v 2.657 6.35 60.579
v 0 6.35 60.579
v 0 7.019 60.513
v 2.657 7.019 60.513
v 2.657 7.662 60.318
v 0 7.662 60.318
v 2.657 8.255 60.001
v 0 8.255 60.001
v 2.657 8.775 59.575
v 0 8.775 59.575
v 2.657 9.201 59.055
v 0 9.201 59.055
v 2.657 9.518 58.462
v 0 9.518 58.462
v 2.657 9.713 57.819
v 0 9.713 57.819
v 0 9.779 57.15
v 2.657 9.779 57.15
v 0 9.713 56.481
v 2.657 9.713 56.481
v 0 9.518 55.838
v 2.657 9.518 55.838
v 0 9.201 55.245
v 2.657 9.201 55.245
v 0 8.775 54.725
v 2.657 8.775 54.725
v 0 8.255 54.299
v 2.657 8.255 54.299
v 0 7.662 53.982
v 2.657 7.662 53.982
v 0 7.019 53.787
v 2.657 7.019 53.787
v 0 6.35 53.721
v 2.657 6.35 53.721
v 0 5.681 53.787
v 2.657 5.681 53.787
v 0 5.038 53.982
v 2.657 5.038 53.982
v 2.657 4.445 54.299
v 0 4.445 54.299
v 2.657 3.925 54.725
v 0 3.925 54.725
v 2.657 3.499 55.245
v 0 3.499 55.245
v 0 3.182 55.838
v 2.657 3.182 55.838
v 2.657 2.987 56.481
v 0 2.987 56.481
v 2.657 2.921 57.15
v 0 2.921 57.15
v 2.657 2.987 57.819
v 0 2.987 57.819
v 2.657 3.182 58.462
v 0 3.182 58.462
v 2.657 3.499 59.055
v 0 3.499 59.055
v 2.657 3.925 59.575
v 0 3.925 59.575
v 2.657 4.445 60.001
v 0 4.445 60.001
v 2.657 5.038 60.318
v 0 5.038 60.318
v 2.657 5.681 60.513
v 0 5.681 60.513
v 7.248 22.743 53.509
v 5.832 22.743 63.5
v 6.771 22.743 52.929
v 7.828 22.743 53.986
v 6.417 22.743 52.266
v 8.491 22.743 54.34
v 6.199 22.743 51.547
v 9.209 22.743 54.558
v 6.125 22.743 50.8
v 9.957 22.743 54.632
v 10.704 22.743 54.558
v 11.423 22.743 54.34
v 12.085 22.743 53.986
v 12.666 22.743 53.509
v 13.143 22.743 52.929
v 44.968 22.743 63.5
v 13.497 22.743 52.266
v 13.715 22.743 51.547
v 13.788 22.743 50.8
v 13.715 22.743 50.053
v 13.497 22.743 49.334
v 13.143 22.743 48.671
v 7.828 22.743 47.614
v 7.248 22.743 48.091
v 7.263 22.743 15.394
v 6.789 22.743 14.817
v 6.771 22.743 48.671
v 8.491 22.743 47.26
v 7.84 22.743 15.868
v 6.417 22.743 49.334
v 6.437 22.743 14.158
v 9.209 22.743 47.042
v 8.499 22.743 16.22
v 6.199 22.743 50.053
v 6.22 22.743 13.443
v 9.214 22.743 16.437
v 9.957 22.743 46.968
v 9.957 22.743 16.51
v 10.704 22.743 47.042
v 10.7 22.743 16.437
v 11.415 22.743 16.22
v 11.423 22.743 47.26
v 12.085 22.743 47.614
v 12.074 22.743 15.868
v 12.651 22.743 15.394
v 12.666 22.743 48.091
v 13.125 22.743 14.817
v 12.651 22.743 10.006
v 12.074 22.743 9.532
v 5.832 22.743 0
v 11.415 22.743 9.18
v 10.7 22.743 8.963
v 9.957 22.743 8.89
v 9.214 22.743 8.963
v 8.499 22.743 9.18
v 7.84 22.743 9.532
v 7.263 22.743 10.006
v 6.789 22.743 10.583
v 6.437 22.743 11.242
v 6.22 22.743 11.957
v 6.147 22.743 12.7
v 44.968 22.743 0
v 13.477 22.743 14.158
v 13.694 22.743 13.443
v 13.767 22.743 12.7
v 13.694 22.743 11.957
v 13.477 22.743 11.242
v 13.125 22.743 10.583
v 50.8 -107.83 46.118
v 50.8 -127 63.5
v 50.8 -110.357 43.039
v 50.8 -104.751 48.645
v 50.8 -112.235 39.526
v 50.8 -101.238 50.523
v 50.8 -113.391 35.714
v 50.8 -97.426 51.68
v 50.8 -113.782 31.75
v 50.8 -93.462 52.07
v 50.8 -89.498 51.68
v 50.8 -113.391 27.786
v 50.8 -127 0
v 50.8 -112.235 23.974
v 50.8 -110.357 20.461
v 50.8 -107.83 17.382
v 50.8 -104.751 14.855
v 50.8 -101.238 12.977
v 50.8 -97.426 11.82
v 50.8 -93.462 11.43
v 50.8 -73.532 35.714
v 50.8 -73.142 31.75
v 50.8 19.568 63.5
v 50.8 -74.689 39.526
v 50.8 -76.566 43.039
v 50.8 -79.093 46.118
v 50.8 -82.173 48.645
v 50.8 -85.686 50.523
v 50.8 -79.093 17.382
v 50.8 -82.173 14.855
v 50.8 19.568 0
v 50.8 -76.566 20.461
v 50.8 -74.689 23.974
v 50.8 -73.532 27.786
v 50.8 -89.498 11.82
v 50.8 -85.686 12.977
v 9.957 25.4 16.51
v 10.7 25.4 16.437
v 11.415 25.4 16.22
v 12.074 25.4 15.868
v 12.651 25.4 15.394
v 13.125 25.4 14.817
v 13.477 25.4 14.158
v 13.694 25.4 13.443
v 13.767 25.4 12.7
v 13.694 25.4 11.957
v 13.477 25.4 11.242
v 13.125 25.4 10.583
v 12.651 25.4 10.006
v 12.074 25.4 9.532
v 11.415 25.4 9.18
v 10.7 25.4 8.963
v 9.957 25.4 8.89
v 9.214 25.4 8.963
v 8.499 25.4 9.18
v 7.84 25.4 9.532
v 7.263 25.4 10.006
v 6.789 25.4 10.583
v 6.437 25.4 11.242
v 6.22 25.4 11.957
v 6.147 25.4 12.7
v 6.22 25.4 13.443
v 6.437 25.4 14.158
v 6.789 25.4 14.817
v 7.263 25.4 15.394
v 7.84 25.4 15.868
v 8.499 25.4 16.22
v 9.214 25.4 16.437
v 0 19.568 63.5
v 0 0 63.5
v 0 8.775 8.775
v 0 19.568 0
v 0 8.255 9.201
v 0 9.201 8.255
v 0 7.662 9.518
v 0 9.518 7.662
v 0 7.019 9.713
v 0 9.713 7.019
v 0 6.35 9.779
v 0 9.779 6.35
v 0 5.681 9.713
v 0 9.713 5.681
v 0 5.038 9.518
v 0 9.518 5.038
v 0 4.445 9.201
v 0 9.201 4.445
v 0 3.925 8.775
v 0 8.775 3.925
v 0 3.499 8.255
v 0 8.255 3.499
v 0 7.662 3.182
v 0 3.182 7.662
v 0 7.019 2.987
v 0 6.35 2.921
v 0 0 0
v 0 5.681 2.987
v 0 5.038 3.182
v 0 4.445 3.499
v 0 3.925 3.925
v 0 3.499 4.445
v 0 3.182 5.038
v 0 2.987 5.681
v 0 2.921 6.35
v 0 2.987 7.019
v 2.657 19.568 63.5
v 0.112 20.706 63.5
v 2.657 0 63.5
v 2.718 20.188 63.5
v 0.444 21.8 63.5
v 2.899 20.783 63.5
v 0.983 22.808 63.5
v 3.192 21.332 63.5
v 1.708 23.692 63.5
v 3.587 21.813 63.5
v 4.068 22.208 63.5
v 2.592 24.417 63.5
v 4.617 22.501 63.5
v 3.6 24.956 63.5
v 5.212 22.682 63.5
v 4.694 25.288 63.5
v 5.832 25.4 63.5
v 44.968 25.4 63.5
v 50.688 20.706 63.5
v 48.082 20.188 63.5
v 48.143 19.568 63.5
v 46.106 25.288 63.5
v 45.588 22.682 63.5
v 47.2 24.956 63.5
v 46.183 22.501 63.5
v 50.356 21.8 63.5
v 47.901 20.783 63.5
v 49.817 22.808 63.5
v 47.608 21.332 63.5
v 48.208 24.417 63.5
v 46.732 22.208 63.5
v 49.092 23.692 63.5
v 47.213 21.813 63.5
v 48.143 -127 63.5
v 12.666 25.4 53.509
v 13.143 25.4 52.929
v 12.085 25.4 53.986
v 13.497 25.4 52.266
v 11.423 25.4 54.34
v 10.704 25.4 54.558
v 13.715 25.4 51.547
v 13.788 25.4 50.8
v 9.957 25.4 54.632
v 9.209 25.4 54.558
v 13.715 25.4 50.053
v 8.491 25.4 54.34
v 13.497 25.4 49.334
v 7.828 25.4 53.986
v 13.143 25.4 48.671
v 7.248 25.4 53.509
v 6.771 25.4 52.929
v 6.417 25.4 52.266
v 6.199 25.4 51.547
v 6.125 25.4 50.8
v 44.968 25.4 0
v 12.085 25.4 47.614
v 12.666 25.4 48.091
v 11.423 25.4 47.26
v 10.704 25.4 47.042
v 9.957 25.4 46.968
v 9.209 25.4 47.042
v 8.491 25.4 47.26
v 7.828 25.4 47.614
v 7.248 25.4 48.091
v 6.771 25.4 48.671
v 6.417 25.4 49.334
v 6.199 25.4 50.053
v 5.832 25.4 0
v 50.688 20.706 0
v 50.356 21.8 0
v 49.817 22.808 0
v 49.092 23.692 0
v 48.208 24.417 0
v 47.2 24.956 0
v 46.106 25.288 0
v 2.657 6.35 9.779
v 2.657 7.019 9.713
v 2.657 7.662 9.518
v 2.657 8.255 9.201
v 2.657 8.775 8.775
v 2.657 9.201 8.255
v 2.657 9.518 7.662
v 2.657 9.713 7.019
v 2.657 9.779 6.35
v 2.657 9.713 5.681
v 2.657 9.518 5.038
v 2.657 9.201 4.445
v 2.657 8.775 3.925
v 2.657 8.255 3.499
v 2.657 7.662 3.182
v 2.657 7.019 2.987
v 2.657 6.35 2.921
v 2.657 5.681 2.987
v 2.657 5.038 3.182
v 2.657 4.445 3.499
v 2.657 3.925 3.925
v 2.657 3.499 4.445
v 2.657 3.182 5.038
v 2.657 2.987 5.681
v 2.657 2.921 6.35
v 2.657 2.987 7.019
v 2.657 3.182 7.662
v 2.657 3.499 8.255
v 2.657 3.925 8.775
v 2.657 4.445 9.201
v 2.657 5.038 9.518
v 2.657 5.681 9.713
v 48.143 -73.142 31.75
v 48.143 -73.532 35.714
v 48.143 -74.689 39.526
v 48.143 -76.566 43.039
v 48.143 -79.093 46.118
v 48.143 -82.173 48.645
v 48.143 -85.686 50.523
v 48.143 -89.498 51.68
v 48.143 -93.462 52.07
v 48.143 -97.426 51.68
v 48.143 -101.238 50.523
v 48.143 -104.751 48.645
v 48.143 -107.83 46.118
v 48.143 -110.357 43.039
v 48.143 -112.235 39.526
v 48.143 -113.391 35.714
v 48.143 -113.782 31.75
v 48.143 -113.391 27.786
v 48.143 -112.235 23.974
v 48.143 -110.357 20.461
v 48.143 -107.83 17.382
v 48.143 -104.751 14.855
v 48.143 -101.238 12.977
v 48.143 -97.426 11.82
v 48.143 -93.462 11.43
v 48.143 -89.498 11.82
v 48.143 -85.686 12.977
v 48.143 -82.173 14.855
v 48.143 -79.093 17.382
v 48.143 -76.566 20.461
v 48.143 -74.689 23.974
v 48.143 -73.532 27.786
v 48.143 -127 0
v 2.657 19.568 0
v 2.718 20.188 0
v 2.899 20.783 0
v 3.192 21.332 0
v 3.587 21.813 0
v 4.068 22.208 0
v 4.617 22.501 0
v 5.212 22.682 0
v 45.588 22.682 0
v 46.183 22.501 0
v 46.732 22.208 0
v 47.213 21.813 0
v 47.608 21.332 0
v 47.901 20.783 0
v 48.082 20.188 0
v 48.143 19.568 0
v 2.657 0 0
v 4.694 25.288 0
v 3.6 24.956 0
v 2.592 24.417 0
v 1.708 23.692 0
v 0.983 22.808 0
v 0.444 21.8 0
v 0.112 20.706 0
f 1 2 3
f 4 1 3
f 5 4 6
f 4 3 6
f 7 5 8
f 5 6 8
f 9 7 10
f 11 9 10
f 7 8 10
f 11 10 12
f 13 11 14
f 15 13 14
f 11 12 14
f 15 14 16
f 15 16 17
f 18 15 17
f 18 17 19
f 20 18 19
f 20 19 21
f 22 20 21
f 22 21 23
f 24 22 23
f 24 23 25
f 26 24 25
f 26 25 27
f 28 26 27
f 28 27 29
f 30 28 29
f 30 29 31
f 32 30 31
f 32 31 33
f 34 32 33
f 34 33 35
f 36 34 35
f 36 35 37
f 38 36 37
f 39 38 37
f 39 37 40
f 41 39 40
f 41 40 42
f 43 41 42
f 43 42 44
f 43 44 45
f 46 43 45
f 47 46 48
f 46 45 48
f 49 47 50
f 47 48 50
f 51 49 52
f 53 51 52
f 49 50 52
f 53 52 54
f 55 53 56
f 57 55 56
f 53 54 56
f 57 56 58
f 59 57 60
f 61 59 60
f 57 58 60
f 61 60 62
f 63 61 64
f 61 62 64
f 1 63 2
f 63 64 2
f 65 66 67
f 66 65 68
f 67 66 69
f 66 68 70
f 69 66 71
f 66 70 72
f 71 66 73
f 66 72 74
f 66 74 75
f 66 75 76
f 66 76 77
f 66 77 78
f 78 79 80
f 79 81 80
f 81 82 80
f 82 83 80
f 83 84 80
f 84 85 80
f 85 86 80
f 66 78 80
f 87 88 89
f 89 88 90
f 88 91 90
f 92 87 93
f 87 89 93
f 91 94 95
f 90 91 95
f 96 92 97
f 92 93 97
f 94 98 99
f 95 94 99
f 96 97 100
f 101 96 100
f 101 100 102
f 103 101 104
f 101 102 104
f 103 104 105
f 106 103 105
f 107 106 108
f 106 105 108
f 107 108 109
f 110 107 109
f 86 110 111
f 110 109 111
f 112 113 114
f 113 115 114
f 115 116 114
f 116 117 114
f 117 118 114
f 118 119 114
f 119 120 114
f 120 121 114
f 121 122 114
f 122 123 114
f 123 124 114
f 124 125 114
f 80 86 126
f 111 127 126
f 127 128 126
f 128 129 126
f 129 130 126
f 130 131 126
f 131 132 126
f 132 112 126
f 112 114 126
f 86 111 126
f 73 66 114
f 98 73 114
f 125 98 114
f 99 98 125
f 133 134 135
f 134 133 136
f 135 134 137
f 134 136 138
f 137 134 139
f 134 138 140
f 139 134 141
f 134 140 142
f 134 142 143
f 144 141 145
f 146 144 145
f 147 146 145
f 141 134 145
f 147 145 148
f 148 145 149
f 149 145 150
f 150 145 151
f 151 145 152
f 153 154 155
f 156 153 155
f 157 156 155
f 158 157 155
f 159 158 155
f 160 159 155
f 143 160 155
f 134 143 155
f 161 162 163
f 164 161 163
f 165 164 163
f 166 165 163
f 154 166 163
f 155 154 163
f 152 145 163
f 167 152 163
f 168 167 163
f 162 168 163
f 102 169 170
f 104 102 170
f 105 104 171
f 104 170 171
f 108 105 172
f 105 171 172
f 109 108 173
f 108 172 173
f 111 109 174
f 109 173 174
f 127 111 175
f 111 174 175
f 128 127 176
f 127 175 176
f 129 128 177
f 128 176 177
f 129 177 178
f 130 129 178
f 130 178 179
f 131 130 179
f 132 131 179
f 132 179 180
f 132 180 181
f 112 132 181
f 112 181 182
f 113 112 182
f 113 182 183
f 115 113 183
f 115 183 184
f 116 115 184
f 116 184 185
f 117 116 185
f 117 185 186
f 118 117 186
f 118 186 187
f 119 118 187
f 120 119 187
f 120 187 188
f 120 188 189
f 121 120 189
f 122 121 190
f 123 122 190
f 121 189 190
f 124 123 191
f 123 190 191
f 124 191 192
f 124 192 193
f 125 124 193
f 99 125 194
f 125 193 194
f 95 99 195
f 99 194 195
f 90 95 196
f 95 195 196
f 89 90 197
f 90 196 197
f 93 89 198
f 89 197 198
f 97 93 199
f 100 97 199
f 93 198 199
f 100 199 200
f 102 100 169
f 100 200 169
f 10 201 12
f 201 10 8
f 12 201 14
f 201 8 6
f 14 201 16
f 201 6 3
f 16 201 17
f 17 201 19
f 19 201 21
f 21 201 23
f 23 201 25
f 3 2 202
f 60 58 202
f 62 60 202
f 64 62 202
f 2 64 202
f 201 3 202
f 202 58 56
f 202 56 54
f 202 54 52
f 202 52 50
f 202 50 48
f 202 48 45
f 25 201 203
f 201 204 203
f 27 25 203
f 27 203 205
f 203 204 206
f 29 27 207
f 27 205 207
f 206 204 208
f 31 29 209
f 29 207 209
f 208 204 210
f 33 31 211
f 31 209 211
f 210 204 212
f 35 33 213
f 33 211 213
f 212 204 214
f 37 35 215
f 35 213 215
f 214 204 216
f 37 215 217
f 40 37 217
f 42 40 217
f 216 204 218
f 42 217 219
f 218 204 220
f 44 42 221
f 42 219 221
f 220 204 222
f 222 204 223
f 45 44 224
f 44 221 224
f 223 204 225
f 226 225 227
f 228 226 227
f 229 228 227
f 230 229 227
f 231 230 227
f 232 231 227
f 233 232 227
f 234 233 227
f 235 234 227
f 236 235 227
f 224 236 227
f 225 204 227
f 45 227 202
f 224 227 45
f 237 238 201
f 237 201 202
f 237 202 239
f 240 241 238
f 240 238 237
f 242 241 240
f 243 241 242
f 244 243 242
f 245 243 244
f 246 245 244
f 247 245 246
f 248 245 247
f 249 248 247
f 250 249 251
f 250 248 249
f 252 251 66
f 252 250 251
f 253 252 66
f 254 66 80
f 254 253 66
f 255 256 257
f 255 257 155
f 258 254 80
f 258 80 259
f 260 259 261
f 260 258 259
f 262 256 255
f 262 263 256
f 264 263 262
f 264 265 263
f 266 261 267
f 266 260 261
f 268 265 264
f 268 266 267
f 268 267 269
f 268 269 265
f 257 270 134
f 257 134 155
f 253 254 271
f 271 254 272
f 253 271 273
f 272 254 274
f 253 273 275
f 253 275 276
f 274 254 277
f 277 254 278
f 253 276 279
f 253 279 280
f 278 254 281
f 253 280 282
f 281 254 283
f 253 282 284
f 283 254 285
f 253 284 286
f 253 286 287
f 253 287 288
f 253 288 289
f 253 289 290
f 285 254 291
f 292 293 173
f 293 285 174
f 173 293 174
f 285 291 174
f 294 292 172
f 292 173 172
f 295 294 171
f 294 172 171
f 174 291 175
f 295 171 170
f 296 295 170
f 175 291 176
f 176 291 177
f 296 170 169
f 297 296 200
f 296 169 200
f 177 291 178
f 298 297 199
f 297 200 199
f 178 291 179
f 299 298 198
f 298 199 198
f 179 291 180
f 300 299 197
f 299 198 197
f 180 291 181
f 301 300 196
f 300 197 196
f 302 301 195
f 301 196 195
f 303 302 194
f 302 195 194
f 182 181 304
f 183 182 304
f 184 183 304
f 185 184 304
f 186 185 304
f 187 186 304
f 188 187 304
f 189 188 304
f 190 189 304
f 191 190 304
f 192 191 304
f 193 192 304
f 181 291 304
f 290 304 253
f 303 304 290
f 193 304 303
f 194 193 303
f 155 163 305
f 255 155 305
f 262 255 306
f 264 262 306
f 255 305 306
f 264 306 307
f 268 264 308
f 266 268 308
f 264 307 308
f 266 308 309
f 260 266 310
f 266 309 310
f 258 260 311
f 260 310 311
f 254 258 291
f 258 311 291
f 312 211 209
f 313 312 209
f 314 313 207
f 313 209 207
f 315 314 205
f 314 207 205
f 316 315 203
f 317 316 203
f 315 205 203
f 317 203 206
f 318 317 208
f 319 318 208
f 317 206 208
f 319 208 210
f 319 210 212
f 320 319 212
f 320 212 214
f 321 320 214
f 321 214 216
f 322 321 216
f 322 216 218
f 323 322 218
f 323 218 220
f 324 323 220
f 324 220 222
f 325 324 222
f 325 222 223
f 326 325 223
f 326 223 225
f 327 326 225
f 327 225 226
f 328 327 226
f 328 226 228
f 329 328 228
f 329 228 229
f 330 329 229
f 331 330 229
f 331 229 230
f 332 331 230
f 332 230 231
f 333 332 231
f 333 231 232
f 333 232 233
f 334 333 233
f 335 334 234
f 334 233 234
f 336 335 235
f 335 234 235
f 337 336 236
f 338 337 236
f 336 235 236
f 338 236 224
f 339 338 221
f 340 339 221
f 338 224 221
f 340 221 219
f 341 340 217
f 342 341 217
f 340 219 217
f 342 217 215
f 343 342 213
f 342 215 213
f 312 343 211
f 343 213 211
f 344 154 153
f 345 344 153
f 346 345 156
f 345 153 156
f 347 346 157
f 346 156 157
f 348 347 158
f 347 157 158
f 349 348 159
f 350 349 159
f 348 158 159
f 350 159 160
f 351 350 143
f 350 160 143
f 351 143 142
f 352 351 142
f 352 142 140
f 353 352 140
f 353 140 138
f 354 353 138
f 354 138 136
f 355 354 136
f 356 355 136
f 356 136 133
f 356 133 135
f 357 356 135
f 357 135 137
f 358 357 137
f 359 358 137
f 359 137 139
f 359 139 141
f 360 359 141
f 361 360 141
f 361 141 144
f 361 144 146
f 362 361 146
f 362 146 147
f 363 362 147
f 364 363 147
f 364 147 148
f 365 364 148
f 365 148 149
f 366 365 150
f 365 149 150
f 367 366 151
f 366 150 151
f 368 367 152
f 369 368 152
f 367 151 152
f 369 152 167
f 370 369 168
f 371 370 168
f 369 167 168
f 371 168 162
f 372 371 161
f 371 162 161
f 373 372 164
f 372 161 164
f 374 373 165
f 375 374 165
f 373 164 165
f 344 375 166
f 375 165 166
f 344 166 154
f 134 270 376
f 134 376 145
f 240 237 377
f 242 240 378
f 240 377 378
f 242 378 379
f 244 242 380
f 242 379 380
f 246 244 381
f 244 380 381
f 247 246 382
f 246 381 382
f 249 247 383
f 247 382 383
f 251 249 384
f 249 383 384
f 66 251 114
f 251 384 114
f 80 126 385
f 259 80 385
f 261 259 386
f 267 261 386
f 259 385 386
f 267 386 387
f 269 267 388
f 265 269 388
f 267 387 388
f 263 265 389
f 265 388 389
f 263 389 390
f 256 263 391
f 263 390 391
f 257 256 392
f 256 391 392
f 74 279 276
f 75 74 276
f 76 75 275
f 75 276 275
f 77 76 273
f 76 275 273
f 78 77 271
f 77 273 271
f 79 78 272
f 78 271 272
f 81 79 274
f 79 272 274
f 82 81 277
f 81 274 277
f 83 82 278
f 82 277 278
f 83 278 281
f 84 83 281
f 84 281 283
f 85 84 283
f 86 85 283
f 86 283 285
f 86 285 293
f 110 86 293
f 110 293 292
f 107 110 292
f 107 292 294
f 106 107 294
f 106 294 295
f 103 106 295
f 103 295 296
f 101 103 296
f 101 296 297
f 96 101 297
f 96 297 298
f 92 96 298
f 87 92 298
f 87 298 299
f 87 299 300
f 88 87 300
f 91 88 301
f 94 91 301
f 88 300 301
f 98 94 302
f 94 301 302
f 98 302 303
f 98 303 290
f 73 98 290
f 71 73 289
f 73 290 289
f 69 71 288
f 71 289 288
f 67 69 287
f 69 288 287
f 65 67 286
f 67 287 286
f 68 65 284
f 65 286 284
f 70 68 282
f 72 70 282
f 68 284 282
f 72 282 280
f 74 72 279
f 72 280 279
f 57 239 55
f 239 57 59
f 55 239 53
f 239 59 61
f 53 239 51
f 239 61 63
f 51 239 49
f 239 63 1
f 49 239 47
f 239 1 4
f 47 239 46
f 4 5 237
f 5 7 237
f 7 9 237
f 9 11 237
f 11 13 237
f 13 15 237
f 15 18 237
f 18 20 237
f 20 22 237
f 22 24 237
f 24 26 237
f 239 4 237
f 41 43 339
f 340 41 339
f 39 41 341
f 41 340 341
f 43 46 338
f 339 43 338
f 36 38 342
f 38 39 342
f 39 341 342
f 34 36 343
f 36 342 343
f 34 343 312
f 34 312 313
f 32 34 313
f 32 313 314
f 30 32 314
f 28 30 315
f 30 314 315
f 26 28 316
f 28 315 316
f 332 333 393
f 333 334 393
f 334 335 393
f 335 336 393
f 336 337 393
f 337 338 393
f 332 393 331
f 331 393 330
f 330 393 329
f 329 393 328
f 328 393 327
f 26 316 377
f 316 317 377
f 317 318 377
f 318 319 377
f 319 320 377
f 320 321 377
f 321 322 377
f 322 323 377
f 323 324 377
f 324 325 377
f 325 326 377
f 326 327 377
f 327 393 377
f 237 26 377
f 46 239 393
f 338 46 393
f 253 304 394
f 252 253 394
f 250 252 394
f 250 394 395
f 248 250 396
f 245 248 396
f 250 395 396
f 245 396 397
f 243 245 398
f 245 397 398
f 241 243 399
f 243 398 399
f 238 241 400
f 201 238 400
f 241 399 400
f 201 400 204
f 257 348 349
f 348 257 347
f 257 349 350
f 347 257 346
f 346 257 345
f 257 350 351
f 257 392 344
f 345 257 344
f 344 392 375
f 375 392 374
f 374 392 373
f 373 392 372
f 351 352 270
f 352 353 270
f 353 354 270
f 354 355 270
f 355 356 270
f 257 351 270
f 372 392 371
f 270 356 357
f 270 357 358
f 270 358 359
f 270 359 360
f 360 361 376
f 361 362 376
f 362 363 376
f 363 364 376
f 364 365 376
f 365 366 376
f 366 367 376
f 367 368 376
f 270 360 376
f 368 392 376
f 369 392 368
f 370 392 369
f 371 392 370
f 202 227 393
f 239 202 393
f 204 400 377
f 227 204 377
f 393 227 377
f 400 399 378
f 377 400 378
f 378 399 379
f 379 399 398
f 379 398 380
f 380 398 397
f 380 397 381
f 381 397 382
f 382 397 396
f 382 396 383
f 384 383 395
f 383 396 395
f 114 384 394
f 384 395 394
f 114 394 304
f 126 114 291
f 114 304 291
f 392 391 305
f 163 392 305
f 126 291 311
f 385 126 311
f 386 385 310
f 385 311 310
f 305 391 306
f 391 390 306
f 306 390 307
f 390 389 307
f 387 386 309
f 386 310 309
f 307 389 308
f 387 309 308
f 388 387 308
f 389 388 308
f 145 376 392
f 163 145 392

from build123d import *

# Parameters (mm, degrees)
BASE_FLANGE1_DEPTH = 63.5
SKETCH6_R          = 3.429
CUT_EXTRUDE1_DEPTH = 6.35
SKETCH7_R          = 20.32
CUT_EXTRUDE2_DEPTH = 6.35
SKETCH8_R          = 3.81
SKETCH8_R_2        = 3.831524444
CUT_EXTRUDE3_DEPTH = 6.35


# Read off the part's stored shape, not the designer's step: Base-Flange1
with BuildPart() as part:
    # Base-Flange1 outline → Base-Flange1 (new body)
    with BuildSketch(Plane.XY):
        with BuildLine():
            Line((48.14316, 19.56816), (48.14316, -127))
            Line((48.14316, -127), (50.8, -127))
            Line((50.8, -127), (50.8, 19.56816))
            ThreePointArc((50.8, 19.56816), (49.091893611, 23.691893611), (44.96816, 25.4))
            Line((44.96816, 25.4), (5.83184, 25.4))
            ThreePointArc((5.83184, 25.4), (1.708106389, 23.691893611), (0, 19.56816))
            Line((0, 19.56816), (0, 0))
            Line((0, 0), (2.65684, 0))
            Line((2.65684, 0), (2.65684, 19.56816))
            ThreePointArc((2.65684, 19.56816), (3.58677597, 21.81322403), (5.83184, 22.74316))
            Line((5.83184, 22.74316), (44.96816, 22.74316))
            ThreePointArc((44.96816, 22.74316), (47.21322403, 21.81322403), (48.14316, 19.56816))
        make_face()
    extrude(amount=BASE_FLANGE1_DEPTH)

    # Sketch6 → Cut-Extrude1 (cut)
    with BuildSketch(Plane.ZY):
        with Locations((6.35, 6.35)):
            Circle(SKETCH6_R)
        with Locations((57.15, 6.35)):
            Circle(SKETCH6_R)
    extrude(amount=-CUT_EXTRUDE1_DEPTH, mode=Mode.SUBTRACT)

    # Sketch7 → Cut-Extrude2 (cut)
    with BuildSketch(Plane(origin=(50.8, 0, 0), x_dir=(0, 0, -1), z_dir=(1, 0, 0))):
        with Locations(Location((-31.75, -93.46184, 0), (0, 0, 90))):
            Circle(SKETCH7_R)
    extrude(amount=-CUT_EXTRUDE2_DEPTH, mode=Mode.SUBTRACT)

    # Sketch8 → Cut-Extrude3 (cut)
    with BuildSketch(Plane(origin=(0, 25.4, 0), x_dir=(1, 0, 0), z_dir=(0, 1, 0))):
        with Locations(Location((9.9568, -12.699999998, 0), (0, 0, 270))):
            Circle(SKETCH8_R)
        with Locations(Location((9.9568, -50.799999998, 0), (0, 0, 270))):
            Circle(SKETCH8_R_2)
    extrude(amount=-CUT_EXTRUDE3_DEPTH, mode=Mode.SUBTRACT)


solid = part.part
